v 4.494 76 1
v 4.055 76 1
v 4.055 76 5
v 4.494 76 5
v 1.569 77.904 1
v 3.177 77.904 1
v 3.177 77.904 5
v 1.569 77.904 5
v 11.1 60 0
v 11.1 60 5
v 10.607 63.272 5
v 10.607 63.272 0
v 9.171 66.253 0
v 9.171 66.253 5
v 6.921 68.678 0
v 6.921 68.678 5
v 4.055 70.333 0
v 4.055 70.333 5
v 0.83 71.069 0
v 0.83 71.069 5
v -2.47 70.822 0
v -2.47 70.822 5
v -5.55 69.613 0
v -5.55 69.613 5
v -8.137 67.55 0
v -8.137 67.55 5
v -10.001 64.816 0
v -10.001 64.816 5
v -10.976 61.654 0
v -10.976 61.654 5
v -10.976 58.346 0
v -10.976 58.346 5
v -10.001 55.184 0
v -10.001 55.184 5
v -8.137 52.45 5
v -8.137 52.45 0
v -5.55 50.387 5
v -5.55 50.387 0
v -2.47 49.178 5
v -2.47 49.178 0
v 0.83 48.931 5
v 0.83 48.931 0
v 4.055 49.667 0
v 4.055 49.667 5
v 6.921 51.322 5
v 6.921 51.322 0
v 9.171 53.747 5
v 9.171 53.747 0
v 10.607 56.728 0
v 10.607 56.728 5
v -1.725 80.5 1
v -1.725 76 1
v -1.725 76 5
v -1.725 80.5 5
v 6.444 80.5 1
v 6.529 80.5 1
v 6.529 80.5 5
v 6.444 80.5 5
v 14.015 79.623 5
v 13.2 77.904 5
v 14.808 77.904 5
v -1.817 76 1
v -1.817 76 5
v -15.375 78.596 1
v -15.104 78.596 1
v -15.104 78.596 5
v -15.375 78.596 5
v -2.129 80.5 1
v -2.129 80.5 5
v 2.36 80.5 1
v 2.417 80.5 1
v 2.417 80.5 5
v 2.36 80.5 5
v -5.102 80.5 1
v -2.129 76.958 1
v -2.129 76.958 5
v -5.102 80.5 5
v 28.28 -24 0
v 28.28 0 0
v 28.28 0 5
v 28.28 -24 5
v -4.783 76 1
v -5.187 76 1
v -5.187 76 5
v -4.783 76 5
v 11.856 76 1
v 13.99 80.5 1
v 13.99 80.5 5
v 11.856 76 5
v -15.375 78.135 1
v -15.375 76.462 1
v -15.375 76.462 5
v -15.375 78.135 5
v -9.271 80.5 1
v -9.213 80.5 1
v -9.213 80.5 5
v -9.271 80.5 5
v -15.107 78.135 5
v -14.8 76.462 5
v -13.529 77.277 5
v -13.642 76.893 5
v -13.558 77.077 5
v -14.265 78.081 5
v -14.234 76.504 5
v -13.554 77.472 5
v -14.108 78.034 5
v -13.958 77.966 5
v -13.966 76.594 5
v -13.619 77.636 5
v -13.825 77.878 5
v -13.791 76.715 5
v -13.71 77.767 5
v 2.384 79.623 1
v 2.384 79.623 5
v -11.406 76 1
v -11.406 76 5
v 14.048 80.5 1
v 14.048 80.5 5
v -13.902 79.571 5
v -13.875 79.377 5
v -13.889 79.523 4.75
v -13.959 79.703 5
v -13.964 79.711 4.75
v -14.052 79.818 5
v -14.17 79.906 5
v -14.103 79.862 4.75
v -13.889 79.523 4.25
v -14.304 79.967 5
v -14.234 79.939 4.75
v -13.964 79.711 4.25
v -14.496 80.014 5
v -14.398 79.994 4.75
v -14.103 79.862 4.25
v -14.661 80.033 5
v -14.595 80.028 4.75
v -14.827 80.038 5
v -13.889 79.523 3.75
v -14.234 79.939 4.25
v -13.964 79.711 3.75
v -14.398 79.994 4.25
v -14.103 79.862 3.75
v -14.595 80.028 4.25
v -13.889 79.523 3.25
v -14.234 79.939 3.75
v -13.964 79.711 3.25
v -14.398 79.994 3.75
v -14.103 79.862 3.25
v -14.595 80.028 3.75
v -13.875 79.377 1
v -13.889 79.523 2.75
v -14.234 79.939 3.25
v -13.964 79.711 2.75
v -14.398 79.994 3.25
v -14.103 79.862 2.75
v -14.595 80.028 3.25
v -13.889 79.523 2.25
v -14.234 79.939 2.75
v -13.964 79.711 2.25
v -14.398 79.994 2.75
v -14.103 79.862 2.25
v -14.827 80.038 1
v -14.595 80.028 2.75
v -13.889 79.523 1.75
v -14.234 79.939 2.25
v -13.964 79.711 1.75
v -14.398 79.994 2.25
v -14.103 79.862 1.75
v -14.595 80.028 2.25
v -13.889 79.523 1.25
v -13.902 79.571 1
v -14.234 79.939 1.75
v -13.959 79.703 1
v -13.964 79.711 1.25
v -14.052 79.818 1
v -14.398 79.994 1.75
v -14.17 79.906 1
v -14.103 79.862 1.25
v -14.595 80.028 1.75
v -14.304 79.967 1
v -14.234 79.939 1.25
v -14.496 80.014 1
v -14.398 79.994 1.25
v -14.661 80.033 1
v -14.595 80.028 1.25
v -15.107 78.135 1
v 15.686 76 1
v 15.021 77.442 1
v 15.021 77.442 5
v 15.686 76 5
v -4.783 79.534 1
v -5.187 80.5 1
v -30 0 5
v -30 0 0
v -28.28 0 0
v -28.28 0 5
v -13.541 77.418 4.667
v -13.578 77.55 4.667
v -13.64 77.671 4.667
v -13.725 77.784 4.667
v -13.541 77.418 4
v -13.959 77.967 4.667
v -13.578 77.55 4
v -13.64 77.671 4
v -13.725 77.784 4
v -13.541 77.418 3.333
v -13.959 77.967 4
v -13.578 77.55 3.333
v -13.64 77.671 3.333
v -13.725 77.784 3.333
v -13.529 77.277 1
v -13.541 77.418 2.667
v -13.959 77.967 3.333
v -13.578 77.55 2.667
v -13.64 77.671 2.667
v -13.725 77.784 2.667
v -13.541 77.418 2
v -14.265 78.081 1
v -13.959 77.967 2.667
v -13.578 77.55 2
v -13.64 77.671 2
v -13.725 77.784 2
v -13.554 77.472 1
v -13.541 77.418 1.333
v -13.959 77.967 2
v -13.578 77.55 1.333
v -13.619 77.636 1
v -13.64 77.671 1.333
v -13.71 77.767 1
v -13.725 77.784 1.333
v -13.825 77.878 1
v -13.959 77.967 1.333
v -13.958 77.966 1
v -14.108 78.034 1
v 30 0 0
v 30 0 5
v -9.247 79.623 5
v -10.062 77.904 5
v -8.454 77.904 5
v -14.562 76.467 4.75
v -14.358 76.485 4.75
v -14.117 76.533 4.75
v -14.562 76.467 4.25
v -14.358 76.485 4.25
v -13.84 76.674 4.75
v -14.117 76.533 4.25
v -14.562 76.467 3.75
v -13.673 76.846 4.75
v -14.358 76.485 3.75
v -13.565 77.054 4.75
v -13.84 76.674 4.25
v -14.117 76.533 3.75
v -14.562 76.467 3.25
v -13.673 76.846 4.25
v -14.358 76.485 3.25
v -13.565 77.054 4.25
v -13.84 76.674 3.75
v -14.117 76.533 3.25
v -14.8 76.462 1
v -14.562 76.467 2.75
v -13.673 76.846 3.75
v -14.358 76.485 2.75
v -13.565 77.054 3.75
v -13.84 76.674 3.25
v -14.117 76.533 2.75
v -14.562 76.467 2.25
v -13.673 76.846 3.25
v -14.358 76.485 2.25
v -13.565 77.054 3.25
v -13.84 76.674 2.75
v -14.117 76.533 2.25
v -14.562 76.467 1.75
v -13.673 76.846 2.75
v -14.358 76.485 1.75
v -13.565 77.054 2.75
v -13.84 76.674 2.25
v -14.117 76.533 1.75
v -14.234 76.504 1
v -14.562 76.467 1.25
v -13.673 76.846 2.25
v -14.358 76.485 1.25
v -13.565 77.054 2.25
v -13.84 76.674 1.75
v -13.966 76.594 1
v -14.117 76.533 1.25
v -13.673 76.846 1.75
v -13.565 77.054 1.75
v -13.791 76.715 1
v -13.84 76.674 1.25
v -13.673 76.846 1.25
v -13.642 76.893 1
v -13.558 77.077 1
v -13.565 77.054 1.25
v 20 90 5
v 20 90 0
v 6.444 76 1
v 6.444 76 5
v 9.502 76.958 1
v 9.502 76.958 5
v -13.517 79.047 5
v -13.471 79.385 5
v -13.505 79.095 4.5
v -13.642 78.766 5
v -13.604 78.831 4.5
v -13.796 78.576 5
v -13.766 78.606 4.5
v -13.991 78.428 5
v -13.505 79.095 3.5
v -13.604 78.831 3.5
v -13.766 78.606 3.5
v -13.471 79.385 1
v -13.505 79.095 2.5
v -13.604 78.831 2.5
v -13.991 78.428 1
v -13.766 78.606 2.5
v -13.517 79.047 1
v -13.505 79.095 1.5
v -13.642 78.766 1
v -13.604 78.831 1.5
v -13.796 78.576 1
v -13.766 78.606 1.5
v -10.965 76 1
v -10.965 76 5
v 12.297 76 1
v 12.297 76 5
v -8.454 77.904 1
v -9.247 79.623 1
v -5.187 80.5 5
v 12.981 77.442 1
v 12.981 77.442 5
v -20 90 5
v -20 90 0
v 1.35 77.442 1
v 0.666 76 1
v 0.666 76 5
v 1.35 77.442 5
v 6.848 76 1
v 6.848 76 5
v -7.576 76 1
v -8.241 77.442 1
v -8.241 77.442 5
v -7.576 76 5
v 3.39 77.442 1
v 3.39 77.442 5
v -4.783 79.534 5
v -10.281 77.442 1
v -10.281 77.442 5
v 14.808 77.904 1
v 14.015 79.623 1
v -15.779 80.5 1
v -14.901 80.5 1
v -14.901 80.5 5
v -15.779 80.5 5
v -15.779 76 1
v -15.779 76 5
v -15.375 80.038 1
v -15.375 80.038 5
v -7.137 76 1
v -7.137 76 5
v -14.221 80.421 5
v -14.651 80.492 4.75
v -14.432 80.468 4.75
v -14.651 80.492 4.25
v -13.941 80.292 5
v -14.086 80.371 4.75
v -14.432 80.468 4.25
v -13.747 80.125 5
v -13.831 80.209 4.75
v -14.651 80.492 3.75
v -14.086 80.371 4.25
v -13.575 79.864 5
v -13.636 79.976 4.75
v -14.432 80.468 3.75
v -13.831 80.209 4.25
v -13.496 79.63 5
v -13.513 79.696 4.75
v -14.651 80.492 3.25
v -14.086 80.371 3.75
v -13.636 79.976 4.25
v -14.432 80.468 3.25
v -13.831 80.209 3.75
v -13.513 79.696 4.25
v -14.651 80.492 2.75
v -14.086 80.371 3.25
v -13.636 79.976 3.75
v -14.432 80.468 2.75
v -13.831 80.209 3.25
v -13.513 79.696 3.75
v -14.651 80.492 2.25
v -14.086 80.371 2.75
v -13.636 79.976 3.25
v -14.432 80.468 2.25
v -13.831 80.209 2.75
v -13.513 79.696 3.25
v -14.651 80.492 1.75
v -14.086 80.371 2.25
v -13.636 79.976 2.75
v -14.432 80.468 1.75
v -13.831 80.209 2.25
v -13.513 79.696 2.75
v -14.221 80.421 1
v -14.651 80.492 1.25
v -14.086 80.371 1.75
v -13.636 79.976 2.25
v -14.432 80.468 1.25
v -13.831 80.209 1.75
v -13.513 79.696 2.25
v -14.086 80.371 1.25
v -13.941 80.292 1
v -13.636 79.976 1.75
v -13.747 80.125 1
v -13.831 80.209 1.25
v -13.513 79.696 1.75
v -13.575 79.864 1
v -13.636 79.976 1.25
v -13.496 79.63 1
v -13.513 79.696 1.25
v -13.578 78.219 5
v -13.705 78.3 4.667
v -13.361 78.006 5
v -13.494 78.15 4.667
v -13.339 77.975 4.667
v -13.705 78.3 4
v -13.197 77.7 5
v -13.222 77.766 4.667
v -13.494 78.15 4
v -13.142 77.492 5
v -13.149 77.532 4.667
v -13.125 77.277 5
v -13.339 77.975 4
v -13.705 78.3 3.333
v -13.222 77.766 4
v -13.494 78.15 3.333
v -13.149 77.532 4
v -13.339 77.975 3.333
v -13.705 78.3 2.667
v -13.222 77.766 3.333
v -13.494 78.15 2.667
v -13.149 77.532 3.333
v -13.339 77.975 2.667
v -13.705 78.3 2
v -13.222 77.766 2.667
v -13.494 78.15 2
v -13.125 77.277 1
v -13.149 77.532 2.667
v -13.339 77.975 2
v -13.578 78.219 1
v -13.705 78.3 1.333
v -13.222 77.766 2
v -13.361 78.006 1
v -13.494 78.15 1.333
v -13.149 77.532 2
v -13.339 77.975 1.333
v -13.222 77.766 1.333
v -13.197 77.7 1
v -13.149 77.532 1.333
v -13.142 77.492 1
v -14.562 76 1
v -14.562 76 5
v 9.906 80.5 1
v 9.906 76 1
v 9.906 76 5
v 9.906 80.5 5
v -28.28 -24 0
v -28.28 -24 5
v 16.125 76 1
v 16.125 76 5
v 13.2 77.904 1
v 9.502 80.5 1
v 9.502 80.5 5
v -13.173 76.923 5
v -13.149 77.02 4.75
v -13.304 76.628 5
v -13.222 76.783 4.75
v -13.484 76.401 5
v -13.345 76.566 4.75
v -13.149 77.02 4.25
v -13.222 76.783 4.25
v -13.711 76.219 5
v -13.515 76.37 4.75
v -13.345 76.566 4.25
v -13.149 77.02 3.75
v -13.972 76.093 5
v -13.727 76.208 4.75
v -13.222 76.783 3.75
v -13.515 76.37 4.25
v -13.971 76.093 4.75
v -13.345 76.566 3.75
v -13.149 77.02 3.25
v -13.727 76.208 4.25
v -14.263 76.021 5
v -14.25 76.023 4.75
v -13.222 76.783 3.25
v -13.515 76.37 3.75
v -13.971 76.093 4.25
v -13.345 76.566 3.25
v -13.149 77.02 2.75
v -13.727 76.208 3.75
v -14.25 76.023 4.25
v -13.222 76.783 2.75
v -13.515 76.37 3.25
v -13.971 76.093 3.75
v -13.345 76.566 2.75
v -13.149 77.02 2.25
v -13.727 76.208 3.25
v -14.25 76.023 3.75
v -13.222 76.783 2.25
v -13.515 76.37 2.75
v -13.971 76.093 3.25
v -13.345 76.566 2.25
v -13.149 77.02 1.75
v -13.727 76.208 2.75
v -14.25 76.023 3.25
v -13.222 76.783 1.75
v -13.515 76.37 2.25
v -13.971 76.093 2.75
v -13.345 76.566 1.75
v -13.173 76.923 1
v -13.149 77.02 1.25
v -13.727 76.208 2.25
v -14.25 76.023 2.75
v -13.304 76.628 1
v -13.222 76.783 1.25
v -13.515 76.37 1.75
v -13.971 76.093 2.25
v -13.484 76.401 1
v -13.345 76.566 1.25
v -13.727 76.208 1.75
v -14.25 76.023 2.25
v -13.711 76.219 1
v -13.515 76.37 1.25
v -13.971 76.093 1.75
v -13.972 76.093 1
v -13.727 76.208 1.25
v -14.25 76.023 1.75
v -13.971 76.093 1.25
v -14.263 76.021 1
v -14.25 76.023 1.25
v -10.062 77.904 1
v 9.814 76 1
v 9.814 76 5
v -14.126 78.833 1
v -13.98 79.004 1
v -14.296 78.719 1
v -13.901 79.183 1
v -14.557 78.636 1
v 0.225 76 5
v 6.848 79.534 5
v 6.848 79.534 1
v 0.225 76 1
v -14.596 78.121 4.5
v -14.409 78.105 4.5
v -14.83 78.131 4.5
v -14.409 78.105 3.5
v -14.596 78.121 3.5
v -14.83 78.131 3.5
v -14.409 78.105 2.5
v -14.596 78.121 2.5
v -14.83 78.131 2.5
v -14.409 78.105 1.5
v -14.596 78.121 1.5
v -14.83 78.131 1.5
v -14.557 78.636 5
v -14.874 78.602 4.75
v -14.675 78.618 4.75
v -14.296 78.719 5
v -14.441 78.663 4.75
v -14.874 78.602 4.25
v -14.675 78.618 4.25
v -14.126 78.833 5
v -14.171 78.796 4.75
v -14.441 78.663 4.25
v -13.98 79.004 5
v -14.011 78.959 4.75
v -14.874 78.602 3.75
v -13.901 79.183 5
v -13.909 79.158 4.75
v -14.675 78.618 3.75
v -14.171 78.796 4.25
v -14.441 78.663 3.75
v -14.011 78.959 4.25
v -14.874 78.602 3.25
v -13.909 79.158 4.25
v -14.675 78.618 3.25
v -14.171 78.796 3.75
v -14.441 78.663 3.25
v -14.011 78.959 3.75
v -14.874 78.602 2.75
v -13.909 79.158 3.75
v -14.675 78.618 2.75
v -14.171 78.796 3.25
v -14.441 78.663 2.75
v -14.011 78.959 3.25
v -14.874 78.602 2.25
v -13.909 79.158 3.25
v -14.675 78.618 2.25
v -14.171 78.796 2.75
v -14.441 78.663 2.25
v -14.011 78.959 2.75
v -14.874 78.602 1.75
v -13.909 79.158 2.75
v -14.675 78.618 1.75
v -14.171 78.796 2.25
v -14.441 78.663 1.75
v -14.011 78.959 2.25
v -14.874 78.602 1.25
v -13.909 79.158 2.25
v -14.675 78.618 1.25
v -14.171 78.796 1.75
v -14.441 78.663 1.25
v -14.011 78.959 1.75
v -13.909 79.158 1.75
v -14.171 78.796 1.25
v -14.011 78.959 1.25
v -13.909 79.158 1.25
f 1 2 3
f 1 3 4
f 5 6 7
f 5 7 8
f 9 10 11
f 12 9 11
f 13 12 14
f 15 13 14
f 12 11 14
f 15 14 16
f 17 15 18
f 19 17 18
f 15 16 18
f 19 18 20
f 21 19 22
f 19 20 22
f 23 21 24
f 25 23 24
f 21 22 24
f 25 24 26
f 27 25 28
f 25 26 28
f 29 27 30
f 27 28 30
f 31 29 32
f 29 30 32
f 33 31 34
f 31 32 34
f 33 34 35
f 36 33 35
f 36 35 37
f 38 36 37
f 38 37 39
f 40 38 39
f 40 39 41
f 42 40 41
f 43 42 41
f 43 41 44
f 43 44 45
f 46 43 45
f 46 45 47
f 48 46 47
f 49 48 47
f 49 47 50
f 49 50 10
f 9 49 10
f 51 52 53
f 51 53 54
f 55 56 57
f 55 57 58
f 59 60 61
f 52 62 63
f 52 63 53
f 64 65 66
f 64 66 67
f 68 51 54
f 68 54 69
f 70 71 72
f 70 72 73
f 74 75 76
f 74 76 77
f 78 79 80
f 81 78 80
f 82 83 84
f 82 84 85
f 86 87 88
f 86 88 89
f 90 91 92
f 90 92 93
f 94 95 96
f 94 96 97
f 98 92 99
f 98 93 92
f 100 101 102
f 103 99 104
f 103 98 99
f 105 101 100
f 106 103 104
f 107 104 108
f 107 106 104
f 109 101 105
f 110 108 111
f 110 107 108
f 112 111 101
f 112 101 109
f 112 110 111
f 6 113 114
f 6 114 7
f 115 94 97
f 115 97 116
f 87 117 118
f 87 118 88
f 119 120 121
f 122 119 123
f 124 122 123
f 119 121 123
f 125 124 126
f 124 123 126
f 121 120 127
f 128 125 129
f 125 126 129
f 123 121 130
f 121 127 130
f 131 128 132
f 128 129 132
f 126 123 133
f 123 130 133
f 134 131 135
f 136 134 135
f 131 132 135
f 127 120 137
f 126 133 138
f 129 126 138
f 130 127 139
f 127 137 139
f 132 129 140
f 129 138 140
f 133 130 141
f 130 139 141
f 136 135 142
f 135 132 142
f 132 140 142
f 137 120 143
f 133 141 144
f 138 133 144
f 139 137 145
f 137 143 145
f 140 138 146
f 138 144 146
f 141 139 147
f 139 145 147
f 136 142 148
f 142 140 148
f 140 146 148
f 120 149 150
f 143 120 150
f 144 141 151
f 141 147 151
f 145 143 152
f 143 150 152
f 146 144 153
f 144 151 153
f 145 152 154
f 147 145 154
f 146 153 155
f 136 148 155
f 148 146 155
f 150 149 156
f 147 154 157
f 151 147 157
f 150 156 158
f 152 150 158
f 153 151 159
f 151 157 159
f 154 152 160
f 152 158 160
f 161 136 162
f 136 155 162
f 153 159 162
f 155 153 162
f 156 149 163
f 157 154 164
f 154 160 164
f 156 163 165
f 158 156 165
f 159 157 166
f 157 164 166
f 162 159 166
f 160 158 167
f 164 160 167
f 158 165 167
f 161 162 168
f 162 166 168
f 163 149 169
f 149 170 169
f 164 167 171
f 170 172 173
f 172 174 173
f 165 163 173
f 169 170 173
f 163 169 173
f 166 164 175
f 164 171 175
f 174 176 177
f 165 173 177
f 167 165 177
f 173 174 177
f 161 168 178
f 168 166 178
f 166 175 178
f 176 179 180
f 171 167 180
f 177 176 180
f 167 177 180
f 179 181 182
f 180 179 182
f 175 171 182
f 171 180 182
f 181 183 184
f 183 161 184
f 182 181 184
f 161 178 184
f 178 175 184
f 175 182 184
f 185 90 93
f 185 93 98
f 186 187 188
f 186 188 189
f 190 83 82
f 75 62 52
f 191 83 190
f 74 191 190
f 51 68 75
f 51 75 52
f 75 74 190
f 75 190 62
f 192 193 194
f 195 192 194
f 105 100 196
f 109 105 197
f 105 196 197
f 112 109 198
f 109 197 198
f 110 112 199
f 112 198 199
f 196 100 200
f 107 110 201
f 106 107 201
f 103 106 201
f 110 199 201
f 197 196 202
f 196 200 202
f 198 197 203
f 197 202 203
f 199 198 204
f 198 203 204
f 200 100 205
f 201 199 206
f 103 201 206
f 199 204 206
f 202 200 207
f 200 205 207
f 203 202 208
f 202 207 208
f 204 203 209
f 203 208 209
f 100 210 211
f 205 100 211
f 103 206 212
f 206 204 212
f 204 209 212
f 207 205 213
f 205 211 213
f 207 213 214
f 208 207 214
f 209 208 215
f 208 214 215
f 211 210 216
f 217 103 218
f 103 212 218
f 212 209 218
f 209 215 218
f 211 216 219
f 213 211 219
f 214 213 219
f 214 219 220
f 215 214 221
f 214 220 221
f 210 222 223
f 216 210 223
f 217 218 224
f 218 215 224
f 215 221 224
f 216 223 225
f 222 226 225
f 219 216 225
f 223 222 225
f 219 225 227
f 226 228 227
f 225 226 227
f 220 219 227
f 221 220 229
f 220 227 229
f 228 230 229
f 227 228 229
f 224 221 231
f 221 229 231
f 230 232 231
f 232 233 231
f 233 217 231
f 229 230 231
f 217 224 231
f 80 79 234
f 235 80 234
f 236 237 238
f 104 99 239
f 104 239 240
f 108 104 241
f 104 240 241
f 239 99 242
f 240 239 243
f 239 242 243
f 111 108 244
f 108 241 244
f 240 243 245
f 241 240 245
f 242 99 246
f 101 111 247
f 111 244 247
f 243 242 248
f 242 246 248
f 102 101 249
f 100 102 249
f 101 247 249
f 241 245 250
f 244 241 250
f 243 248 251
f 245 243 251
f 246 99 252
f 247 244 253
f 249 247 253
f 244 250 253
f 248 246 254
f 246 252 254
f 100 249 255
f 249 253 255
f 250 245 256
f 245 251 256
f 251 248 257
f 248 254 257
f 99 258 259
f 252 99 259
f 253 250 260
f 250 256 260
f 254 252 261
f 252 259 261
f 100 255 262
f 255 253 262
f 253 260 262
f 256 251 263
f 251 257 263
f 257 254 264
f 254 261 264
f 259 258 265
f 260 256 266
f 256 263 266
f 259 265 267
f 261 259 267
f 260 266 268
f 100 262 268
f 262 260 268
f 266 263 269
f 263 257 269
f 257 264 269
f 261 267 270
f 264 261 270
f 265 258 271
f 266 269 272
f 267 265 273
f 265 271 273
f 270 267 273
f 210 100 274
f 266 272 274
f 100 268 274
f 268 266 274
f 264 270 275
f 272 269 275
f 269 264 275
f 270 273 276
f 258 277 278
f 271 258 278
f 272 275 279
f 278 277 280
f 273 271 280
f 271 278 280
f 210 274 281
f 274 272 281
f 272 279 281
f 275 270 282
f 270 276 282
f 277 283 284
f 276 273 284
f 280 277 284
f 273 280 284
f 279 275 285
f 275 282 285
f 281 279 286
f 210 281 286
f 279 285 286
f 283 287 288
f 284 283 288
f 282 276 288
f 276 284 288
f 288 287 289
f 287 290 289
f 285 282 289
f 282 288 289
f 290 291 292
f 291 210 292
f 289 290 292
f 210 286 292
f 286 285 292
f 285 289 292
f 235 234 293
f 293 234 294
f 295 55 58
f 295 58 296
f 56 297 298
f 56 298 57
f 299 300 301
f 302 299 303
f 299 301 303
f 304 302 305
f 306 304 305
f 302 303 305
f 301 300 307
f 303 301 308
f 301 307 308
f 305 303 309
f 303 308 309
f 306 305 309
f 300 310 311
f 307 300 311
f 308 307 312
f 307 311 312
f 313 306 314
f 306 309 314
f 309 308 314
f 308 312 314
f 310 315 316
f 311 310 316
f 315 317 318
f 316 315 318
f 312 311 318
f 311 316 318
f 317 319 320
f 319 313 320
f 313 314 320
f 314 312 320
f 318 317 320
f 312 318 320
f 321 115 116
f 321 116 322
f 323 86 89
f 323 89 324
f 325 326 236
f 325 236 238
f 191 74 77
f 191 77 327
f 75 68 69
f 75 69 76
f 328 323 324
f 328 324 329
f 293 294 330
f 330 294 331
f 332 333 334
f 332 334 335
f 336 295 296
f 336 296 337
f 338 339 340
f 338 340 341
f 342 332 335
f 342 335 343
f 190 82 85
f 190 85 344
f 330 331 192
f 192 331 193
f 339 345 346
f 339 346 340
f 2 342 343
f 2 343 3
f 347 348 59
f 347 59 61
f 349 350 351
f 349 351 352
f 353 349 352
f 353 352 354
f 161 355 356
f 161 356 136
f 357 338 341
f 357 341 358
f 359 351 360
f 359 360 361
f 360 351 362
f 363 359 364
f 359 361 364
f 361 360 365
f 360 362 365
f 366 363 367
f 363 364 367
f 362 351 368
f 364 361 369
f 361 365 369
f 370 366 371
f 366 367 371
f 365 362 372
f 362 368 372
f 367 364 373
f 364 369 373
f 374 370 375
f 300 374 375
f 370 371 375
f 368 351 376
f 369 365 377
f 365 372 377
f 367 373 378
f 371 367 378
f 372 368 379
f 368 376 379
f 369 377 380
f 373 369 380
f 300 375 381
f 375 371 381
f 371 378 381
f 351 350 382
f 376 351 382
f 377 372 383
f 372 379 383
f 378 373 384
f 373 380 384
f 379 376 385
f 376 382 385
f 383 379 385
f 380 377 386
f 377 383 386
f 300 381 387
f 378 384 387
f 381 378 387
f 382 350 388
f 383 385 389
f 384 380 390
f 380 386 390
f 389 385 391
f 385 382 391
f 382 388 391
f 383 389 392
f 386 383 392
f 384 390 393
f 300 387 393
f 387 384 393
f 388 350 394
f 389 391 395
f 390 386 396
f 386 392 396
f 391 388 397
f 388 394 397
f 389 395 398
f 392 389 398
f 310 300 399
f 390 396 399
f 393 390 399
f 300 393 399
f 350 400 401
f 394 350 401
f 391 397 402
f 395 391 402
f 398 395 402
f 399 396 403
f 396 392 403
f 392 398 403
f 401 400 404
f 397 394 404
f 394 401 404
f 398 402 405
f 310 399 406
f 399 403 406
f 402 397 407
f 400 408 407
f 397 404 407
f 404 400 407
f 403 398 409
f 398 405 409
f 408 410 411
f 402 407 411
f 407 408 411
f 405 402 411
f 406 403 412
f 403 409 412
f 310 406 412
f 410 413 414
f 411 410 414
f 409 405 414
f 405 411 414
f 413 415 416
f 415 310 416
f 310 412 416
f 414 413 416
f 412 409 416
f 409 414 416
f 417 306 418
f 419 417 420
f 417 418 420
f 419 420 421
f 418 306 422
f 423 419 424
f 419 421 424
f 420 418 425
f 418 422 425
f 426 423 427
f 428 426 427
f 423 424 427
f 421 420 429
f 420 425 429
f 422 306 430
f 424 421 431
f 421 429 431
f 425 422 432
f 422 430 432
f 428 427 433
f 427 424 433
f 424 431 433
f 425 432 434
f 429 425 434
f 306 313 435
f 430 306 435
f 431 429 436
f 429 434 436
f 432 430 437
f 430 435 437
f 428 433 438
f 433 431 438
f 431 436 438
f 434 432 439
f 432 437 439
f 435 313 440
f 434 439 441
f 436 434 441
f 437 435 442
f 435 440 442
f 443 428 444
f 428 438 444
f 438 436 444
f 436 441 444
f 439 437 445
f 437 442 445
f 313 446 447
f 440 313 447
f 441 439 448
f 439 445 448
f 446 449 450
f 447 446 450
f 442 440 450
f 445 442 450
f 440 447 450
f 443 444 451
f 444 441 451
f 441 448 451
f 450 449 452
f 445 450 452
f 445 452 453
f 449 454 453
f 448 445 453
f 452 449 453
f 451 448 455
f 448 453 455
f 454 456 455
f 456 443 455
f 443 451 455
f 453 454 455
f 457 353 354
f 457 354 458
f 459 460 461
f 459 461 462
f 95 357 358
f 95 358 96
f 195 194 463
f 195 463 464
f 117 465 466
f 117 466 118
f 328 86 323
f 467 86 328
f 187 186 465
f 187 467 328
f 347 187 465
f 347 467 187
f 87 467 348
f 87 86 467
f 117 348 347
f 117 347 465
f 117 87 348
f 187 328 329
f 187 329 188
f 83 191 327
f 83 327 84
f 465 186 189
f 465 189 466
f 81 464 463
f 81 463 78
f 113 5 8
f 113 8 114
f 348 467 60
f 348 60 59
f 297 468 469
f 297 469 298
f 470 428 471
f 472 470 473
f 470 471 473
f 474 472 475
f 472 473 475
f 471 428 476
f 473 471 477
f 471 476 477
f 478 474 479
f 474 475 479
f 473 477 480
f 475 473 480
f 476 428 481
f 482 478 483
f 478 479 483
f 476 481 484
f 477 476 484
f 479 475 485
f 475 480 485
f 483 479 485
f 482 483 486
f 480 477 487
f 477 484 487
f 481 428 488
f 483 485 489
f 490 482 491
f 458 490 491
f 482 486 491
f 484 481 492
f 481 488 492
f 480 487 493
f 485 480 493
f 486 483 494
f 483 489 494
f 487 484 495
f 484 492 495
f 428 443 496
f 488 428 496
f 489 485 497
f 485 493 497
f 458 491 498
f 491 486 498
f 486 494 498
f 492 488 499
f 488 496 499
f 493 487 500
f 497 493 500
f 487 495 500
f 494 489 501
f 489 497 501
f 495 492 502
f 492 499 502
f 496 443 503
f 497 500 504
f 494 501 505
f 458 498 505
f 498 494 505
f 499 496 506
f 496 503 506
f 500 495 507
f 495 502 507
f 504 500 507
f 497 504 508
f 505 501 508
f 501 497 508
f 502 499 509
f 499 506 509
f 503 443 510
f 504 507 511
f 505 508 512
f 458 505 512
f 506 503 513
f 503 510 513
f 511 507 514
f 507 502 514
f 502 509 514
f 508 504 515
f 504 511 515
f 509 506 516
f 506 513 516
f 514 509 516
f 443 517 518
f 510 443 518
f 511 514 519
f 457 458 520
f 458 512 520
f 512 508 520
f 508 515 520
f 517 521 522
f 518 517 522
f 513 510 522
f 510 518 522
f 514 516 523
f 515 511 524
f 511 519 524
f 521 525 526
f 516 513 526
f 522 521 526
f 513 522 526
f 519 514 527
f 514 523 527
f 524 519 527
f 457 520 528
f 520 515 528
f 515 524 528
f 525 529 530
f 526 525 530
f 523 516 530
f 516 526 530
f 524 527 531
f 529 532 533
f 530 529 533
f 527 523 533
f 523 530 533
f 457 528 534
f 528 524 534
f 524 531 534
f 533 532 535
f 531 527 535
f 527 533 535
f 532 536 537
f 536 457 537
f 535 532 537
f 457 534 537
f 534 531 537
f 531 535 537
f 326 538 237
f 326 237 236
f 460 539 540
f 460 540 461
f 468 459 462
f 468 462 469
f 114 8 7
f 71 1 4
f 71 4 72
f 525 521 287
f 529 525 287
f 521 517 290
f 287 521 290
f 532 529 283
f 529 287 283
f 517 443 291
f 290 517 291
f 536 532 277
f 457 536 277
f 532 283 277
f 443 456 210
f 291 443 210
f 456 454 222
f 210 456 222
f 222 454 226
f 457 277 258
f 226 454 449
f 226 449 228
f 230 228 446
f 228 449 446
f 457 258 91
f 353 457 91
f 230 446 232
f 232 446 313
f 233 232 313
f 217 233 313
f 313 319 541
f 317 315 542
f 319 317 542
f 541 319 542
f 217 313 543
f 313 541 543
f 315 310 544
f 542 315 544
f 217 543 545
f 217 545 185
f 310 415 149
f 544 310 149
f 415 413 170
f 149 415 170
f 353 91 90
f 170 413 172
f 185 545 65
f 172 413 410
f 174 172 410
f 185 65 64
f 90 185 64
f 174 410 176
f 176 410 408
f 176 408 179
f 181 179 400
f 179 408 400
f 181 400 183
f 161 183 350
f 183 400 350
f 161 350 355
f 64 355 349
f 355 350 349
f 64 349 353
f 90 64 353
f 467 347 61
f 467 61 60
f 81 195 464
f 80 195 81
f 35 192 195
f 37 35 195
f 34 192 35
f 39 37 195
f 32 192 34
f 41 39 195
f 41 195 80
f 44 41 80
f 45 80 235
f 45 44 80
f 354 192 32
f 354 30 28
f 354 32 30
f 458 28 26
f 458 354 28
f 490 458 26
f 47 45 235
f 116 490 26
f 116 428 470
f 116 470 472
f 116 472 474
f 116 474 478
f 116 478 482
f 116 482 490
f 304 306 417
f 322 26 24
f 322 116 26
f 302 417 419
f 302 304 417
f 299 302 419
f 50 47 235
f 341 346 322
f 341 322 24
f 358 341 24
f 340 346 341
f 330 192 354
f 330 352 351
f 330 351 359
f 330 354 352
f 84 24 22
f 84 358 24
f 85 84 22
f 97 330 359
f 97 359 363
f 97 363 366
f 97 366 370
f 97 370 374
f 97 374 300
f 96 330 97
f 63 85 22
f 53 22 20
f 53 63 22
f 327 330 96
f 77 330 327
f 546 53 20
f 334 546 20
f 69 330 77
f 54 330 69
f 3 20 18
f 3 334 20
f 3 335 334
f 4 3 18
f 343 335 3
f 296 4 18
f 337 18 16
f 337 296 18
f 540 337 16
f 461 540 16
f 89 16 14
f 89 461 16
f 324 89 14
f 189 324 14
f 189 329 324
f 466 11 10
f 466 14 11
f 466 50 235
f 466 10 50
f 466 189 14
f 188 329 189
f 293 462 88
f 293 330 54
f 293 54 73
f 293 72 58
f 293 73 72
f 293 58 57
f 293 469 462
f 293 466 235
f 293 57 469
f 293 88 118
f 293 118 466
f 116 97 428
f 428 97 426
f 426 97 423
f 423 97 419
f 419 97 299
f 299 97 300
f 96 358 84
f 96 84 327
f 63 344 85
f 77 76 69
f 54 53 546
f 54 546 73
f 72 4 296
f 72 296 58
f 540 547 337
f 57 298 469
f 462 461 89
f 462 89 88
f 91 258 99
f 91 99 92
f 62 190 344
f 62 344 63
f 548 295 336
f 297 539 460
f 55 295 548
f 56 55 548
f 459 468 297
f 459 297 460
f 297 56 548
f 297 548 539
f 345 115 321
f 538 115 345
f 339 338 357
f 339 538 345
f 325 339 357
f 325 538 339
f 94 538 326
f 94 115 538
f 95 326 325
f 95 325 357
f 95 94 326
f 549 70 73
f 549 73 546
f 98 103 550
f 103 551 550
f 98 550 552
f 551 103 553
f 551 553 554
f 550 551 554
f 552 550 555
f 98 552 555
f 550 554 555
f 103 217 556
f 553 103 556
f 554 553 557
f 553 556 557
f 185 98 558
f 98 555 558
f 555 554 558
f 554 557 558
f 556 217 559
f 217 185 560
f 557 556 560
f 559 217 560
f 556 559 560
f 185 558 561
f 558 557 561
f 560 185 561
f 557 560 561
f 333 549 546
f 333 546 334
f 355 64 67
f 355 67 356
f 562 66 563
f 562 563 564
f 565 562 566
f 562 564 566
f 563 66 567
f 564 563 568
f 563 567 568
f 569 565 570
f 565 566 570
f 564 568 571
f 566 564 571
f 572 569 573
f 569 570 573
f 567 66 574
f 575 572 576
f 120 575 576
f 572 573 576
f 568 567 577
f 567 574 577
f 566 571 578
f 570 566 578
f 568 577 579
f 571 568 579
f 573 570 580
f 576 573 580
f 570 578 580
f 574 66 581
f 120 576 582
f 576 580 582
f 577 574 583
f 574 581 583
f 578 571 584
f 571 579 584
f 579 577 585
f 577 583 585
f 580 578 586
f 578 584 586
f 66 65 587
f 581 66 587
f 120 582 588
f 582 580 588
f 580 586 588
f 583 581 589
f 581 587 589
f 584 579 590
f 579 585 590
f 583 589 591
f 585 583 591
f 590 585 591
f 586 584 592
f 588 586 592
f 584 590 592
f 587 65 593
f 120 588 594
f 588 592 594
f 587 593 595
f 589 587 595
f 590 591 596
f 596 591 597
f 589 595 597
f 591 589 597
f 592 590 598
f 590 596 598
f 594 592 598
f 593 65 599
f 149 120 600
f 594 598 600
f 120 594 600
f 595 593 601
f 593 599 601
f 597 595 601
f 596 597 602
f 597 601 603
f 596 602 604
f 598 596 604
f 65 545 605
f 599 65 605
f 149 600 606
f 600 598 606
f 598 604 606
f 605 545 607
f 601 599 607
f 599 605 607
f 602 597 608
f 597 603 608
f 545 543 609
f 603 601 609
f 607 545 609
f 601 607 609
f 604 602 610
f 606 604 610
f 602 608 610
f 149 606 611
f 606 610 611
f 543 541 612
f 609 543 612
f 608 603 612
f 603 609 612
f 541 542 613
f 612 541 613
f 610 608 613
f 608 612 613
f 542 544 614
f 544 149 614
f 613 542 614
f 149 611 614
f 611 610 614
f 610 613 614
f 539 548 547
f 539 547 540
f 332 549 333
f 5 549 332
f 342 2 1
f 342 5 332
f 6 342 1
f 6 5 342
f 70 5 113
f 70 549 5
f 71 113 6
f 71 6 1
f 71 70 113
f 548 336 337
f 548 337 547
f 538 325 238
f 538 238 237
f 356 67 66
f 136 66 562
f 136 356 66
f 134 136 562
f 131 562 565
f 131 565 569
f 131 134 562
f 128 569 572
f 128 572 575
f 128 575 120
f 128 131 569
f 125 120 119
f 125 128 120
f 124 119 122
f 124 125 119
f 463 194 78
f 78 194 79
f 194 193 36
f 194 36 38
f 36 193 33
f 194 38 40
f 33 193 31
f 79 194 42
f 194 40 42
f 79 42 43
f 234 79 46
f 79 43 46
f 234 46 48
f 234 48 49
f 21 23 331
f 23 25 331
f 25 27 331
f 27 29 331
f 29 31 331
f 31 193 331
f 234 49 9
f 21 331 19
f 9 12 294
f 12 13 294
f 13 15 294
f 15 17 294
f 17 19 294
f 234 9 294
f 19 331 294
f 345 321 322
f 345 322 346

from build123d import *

# Parameters (mm, degrees)
SKETCH1_R           = 5.25
BOSS_EXTRUDE1_DEPTH = 5
SKETCH3_R           = 11.1
CUT_EXTRUDE1_DEPTH  = 6
WRAP1_START         = -4
WRAP1_DEPTH         = 4
SKETCH5_W           = 56.56
SKETCH5_H           = 5
BOSS_EXTRUDE2_DEPTH = 24


# Read off the part's stored shape, not the designer's step: Wrap1
with BuildPart() as part:
    # Sketch1 → Boss-Extrude1 (new body)
    with BuildSketch(Plane.XY):
        Polygon((-30, 0), (30, 0), (20, 90), (-20, 90), align=None)
        with Locations((0, 60)):
            Circle(SKETCH1_R, mode=Mode.SUBTRACT)
    extrude(amount=BOSS_EXTRUDE1_DEPTH)

    # Sketch3 → Cut-Extrude1 (cut)
    with BuildSketch(Plane.XY.offset(5)):
        with Locations((0, 60)):
            Circle(SKETCH3_R)
    extrude(amount=-CUT_EXTRUDE1_DEPTH, mode=Mode.SUBTRACT)

    # Wrap1 outline → Wrap1 (cut)
    # profile 1 of 6: a face of its own
    with BuildSketch(Plane.XY.offset(5).offset(WRAP1_START)):
        with BuildLine():
            add(Edge.make_bspline(
                [(-14.900841346, 80.5), (-14.857861874, 80.499774035), (-14.774556961, 80.499336059), (-14.653417679, 80.492543462), (-14.539954922, 80.483281601), (-14.434135786, 80.468585767), (-14.336009169, 80.450853482), (-14.245279349, 80.429379719), (-14.162234842, 80.403631216), (-14.063089895, 80.362685997), (-13.950049046, 80.301841923), (-13.827651112, 80.211933768), (-13.722988519, 80.101963458), (-13.632748968, 79.97791433), (-13.561004671, 79.841454052), (-13.509101289, 79.695835095), (-13.476241164, 79.542935713), (-13.472861748, 79.437965912), (-13.471153846, 79.384915865)],
                knots=[0, 0, 0, 0, 0.062594097, 0.121322939, 0.176680142, 0.228365096, 0.276868446, 0.321879128, 0.364098625, 0.403355696, 0.477967948, 0.550535461, 0.623584457, 0.698174882, 0.77335367, 0.847281125, 0.92281834, 1, 1, 1, 1], degree=3))
            Line((-14.900841346, 80.5), (-15.778846154, 80.5))
            Line((-15.778846154, 80.5), (-15.778846154, 76))
            Line((-15.778846154, 76), (-14.561899038, 76))
            add(Edge.make_bspline(
                [(-13.125, 77.27734375), (-13.126255945, 77.233414914), (-13.128727052, 77.1469837), (-13.146958444, 77.020012812), (-13.177827296, 76.898673595), (-13.220347341, 76.782181218), (-13.275841746, 76.670761045), (-13.3433777, 76.564286848), (-13.423903996, 76.463828423), (-13.513984827, 76.368269479), (-13.6158933, 76.282348038), (-13.725842128, 76.205827844), (-13.845215968, 76.142897193), (-13.972054246, 76.090033736), (-14.107779795, 76.049653053), (-14.251783147, 76.021402601), (-14.403940107, 76.002367553), (-14.508352644, 76.000802575), (-14.561899038, 76)],
                knots=[0, 0, 0, 0, 0.061160277, 0.120334558, 0.178180255, 0.235235126, 0.292682961, 0.351186248, 0.41045661, 0.471719854, 0.533761203, 0.595739024, 0.657887515, 0.72129518, 0.786822515, 0.854686154, 0.925477986, 1, 1, 1, 1], degree=3))
            add(Edge.make_bspline(
                [(-13.991286058, 78.427584135), (-13.940165508, 78.407957707), (-13.842359233, 78.37040749), (-13.707762931, 78.304019037), (-13.59179813, 78.231810609), (-13.493573228, 78.152955373), (-13.409567672, 78.067958331), (-13.33621389, 77.975573184), (-13.273623552, 77.874594781), (-13.21999265, 77.76607595), (-13.178144249, 77.651124776), (-13.146803801, 77.530819492), (-13.128845652, 77.405591493), (-13.126290113, 77.320367434), (-13.125, 77.27734375)],
                knots=[0, 0, 0, 0, 0.106057493, 0.202914257, 0.290300165, 0.370222566, 0.446383721, 0.5213969, 0.598291083, 0.676142469, 0.7555287, 0.834887172, 0.916646049, 1, 1, 1, 1], degree=3))
            add(Edge.make_bspline(
                [(-13.471153846, 79.384915865), (-13.472559413, 79.335219722), (-13.475321484, 79.237562115), (-13.501733603, 79.094726831), (-13.543083034, 78.958760979), (-13.600561211, 78.830160769), (-13.675263778, 78.711831838), (-13.763795902, 78.602819638), (-13.870608933, 78.507739708), (-13.950635956, 78.454584548), (-13.991286058, 78.427584135)],
                knots=[0, 0, 0, 0, 0.130569107, 0.256580609, 0.380551617, 0.503622917, 0.625739323, 0.747548582, 0.871766119, 1, 1, 1, 1], degree=3))
        make_face()
        with BuildLine():
            add(Edge.make_bspline(
                [(-14.799879808, 76.461538462), (-14.758712617, 76.462031851), (-14.679368285, 76.462982794), (-14.56480956, 76.466087222), (-14.458631284, 76.473148719), (-14.361317967, 76.484264811), (-14.271818813, 76.496322817), (-14.191207481, 76.512537321), (-14.118830518, 76.531114556), (-14.034906408, 76.559829921), (-13.940401897, 76.604439669), (-13.838559368, 76.671700817), (-13.748011373, 76.751830784), (-13.671118897, 76.844570531), (-13.608102197, 76.945410809), (-13.562259469, 77.052311973), (-13.533985511, 77.163507651), (-13.530562721, 77.239321996), (-13.528846154, 77.27734375)],
                knots=[0, 0, 0, 0, 0.072502489, 0.139738989, 0.201795135, 0.259821934, 0.312205989, 0.360773434, 0.404540343, 0.443698099, 0.516840794, 0.587874336, 0.657965418, 0.728969389, 0.79930772, 0.866635778, 0.933116329, 1, 1, 1, 1], degree=3))
            Line((-14.799879808, 76.461538462), (-15.375, 76.461538462))
            Line((-15.375, 76.461538462), (-15.375, 78.134615385))
            Line((-15.375, 78.134615385), (-15.107271635, 78.134615385))
            add(Edge.make_bspline(
                [(-14.265324519, 78.081430288), (-14.287219071, 78.085872539), (-14.334690975, 78.095504255), (-14.412100722, 78.105671303), (-14.50047541, 78.114729237), (-14.60001911, 78.121429297), (-14.710857762, 78.128354852), (-14.833228087, 78.131048194), (-14.966630348, 78.134261528), (-15.05919197, 78.134494415), (-15.107271635, 78.134615385)],
                knots=[0, 0, 0, 0, 0.079306486, 0.171952819, 0.277056507, 0.394730576, 0.526177321, 0.671344767, 0.829285257, 1, 1, 1, 1], degree=3))
            add(Edge.make_bspline(
                [(-13.528846154, 77.27734375), (-13.529201145, 77.301120902), (-13.529905402, 77.348291679), (-13.540526192, 77.417612018), (-13.555972596, 77.484759569), (-13.575941583, 77.549916664), (-13.605023755, 77.611905291), (-13.638975027, 77.671951439), (-13.678782543, 77.730134484), (-13.740810757, 77.803693095), (-13.831031879, 77.88844354), (-13.959226305, 77.971420329), (-14.104990688, 78.038338938), (-14.21071175, 78.066752551), (-14.265324519, 78.081430288)],
                knots=[0, 0, 0, 0, 0.060287398, 0.119602355, 0.177503371, 0.235142664, 0.292132593, 0.350871209, 0.410097863, 0.470731522, 0.594828704, 0.722578824, 0.85669139, 1, 1, 1, 1], degree=3))
        make_face(mode=Mode.SUBTRACT)
        with BuildLine():
            add(Edge.make_bspline(
                [(-15.103665865, 78.596153846), (-15.064003128, 78.596668033), (-14.987366638, 78.597661546), (-14.876383914, 78.600507497), (-14.773366033, 78.60847641), (-14.678490819, 78.616443033), (-14.591907677, 78.629396074), (-14.513808427, 78.644814518), (-14.442967373, 78.66112111), (-14.361273672, 78.688853307), (-14.268608453, 78.72983889), (-14.169823033, 78.793445536), (-14.082735858, 78.869205419), (-14.009196616, 78.95662237), (-13.94901044, 79.052878894), (-13.907207092, 79.156439169), (-13.878860584, 79.264722196), (-13.876300043, 79.33905995), (-13.875, 79.376802885)],
                knots=[0, 0, 0, 0, 0.072301034, 0.139700332, 0.202288511, 0.260599533, 0.313190329, 0.361738933, 0.405706476, 0.445539985, 0.518831956, 0.58977824, 0.658867479, 0.728430478, 0.797282704, 0.864815377, 0.931363753, 1, 1, 1, 1], degree=3))
            Line((-15.103665865, 78.596153846), (-15.375, 78.596153846))
            Line((-15.375, 78.596153846), (-15.375, 80.038461538))
            Line((-15.375, 80.038461538), (-14.826923077, 80.038461538))
            add(Edge.make_bspline(
                [(-13.875, 79.376802885), (-13.875676517, 79.401778877), (-13.87700358, 79.450772012), (-13.887872112, 79.52219261), (-13.906344708, 79.589363149), (-13.930071656, 79.653204148), (-13.963228542, 79.711719384), (-14.00226728, 79.766932064), (-14.049434596, 79.816961931), (-14.10312257, 79.863722715), (-14.164847942, 79.905179965), (-14.234573889, 79.941489517), (-14.313243759, 79.970727659), (-14.399531715, 79.99633414), (-14.494765971, 80.01431909), (-14.59784754, 80.029302017), (-14.70962075, 80.036929828), (-14.786950167, 80.03793958), (-14.826923077, 80.038461538)],
                knots=[0, 0, 0, 0, 0.057003133, 0.111817869, 0.164402372, 0.215869805, 0.26684111, 0.317478963, 0.369902136, 0.423400449, 0.479718398, 0.539241497, 0.602430689, 0.671029546, 0.744484798, 0.823453971, 0.908740313, 1, 1, 1, 1], degree=3))
        make_face(mode=Mode.SUBTRACT)
    # profile 2 of 6: a face of its own
    with BuildSketch(Plane.XY.offset(5).offset(WRAP1_START)):
        Polygon((15.685997596, 76), (16.125, 76), (14.048076923, 80.5), (13.990384615, 80.5), (11.855769231, 76), (12.296574519, 76), (12.980769231, 77.442307692), (15.020733173, 77.442307692), align=None)
        Polygon((14.807992788, 77.903846154), (13.199819712, 77.903846154), (14.014723558, 79.622896635), align=None, mode=Mode.SUBTRACT)
    # profile 3 of 6: a face of its own
    with BuildSketch(Plane.XY.offset(5).offset(WRAP1_START)):
        Polygon((9.813822115, 76), (9.905769231, 76), (9.905769231, 80.5), (9.501923077, 80.5), (9.501923077, 76.958233173), (6.528966346, 80.5), (6.444230769, 80.5), (6.444230769, 76), (6.848076923, 76), (6.848076923, 79.533653846), align=None)
    # profile 4 of 6: a face of its own
    with BuildSketch(Plane.XY.offset(5).offset(WRAP1_START)):
        Polygon((4.055228365, 76), (4.494230769, 76), (2.417307692, 80.5), (2.359615385, 80.5), (0.225, 76), (0.665805288, 76), (1.35, 77.442307692), (3.389963942, 77.442307692), align=None)
        Polygon((3.177223558, 77.903846154), (1.569050481, 77.903846154), (2.383954327, 79.622896635), align=None, mode=Mode.SUBTRACT)
    # profile 5 of 6: a face of its own
    with BuildSketch(Plane.XY.offset(5).offset(WRAP1_START)):
        Polygon((-1.816947115, 76), (-1.725, 76), (-1.725, 80.5), (-2.128846154, 80.5), (-2.128846154, 76.958233173), (-5.101802885, 80.5), (-5.186538462, 80.5), (-5.186538462, 76), (-4.782692308, 76), (-4.782692308, 79.533653846), align=None)
    # profile 6 of 6: a face of its own
    with BuildSketch(Plane.XY.offset(5).offset(WRAP1_START)):
        Polygon((-7.575540865, 76), (-7.136538462, 76), (-9.213461538, 80.5), (-9.271153846, 80.5), (-11.405769231, 76), (-10.964963942, 76), (-10.280769231, 77.442307692), (-8.240805288, 77.442307692), align=None)
        Polygon((-8.453545673, 77.903846154), (-10.06171875, 77.903846154), (-9.246814904, 79.622896635), align=None, mode=Mode.SUBTRACT)
    extrude(amount=WRAP1_DEPTH, mode=Mode.SUBTRACT)

    # Sketch5 → Boss-Extrude2 (add)
    with BuildSketch(Plane.XZ):
        with Locations((0, 2.5)):
            Rectangle(SKETCH5_W, SKETCH5_H)
    extrude(amount=BOSS_EXTRUDE2_DEPTH)


solid = part.part
